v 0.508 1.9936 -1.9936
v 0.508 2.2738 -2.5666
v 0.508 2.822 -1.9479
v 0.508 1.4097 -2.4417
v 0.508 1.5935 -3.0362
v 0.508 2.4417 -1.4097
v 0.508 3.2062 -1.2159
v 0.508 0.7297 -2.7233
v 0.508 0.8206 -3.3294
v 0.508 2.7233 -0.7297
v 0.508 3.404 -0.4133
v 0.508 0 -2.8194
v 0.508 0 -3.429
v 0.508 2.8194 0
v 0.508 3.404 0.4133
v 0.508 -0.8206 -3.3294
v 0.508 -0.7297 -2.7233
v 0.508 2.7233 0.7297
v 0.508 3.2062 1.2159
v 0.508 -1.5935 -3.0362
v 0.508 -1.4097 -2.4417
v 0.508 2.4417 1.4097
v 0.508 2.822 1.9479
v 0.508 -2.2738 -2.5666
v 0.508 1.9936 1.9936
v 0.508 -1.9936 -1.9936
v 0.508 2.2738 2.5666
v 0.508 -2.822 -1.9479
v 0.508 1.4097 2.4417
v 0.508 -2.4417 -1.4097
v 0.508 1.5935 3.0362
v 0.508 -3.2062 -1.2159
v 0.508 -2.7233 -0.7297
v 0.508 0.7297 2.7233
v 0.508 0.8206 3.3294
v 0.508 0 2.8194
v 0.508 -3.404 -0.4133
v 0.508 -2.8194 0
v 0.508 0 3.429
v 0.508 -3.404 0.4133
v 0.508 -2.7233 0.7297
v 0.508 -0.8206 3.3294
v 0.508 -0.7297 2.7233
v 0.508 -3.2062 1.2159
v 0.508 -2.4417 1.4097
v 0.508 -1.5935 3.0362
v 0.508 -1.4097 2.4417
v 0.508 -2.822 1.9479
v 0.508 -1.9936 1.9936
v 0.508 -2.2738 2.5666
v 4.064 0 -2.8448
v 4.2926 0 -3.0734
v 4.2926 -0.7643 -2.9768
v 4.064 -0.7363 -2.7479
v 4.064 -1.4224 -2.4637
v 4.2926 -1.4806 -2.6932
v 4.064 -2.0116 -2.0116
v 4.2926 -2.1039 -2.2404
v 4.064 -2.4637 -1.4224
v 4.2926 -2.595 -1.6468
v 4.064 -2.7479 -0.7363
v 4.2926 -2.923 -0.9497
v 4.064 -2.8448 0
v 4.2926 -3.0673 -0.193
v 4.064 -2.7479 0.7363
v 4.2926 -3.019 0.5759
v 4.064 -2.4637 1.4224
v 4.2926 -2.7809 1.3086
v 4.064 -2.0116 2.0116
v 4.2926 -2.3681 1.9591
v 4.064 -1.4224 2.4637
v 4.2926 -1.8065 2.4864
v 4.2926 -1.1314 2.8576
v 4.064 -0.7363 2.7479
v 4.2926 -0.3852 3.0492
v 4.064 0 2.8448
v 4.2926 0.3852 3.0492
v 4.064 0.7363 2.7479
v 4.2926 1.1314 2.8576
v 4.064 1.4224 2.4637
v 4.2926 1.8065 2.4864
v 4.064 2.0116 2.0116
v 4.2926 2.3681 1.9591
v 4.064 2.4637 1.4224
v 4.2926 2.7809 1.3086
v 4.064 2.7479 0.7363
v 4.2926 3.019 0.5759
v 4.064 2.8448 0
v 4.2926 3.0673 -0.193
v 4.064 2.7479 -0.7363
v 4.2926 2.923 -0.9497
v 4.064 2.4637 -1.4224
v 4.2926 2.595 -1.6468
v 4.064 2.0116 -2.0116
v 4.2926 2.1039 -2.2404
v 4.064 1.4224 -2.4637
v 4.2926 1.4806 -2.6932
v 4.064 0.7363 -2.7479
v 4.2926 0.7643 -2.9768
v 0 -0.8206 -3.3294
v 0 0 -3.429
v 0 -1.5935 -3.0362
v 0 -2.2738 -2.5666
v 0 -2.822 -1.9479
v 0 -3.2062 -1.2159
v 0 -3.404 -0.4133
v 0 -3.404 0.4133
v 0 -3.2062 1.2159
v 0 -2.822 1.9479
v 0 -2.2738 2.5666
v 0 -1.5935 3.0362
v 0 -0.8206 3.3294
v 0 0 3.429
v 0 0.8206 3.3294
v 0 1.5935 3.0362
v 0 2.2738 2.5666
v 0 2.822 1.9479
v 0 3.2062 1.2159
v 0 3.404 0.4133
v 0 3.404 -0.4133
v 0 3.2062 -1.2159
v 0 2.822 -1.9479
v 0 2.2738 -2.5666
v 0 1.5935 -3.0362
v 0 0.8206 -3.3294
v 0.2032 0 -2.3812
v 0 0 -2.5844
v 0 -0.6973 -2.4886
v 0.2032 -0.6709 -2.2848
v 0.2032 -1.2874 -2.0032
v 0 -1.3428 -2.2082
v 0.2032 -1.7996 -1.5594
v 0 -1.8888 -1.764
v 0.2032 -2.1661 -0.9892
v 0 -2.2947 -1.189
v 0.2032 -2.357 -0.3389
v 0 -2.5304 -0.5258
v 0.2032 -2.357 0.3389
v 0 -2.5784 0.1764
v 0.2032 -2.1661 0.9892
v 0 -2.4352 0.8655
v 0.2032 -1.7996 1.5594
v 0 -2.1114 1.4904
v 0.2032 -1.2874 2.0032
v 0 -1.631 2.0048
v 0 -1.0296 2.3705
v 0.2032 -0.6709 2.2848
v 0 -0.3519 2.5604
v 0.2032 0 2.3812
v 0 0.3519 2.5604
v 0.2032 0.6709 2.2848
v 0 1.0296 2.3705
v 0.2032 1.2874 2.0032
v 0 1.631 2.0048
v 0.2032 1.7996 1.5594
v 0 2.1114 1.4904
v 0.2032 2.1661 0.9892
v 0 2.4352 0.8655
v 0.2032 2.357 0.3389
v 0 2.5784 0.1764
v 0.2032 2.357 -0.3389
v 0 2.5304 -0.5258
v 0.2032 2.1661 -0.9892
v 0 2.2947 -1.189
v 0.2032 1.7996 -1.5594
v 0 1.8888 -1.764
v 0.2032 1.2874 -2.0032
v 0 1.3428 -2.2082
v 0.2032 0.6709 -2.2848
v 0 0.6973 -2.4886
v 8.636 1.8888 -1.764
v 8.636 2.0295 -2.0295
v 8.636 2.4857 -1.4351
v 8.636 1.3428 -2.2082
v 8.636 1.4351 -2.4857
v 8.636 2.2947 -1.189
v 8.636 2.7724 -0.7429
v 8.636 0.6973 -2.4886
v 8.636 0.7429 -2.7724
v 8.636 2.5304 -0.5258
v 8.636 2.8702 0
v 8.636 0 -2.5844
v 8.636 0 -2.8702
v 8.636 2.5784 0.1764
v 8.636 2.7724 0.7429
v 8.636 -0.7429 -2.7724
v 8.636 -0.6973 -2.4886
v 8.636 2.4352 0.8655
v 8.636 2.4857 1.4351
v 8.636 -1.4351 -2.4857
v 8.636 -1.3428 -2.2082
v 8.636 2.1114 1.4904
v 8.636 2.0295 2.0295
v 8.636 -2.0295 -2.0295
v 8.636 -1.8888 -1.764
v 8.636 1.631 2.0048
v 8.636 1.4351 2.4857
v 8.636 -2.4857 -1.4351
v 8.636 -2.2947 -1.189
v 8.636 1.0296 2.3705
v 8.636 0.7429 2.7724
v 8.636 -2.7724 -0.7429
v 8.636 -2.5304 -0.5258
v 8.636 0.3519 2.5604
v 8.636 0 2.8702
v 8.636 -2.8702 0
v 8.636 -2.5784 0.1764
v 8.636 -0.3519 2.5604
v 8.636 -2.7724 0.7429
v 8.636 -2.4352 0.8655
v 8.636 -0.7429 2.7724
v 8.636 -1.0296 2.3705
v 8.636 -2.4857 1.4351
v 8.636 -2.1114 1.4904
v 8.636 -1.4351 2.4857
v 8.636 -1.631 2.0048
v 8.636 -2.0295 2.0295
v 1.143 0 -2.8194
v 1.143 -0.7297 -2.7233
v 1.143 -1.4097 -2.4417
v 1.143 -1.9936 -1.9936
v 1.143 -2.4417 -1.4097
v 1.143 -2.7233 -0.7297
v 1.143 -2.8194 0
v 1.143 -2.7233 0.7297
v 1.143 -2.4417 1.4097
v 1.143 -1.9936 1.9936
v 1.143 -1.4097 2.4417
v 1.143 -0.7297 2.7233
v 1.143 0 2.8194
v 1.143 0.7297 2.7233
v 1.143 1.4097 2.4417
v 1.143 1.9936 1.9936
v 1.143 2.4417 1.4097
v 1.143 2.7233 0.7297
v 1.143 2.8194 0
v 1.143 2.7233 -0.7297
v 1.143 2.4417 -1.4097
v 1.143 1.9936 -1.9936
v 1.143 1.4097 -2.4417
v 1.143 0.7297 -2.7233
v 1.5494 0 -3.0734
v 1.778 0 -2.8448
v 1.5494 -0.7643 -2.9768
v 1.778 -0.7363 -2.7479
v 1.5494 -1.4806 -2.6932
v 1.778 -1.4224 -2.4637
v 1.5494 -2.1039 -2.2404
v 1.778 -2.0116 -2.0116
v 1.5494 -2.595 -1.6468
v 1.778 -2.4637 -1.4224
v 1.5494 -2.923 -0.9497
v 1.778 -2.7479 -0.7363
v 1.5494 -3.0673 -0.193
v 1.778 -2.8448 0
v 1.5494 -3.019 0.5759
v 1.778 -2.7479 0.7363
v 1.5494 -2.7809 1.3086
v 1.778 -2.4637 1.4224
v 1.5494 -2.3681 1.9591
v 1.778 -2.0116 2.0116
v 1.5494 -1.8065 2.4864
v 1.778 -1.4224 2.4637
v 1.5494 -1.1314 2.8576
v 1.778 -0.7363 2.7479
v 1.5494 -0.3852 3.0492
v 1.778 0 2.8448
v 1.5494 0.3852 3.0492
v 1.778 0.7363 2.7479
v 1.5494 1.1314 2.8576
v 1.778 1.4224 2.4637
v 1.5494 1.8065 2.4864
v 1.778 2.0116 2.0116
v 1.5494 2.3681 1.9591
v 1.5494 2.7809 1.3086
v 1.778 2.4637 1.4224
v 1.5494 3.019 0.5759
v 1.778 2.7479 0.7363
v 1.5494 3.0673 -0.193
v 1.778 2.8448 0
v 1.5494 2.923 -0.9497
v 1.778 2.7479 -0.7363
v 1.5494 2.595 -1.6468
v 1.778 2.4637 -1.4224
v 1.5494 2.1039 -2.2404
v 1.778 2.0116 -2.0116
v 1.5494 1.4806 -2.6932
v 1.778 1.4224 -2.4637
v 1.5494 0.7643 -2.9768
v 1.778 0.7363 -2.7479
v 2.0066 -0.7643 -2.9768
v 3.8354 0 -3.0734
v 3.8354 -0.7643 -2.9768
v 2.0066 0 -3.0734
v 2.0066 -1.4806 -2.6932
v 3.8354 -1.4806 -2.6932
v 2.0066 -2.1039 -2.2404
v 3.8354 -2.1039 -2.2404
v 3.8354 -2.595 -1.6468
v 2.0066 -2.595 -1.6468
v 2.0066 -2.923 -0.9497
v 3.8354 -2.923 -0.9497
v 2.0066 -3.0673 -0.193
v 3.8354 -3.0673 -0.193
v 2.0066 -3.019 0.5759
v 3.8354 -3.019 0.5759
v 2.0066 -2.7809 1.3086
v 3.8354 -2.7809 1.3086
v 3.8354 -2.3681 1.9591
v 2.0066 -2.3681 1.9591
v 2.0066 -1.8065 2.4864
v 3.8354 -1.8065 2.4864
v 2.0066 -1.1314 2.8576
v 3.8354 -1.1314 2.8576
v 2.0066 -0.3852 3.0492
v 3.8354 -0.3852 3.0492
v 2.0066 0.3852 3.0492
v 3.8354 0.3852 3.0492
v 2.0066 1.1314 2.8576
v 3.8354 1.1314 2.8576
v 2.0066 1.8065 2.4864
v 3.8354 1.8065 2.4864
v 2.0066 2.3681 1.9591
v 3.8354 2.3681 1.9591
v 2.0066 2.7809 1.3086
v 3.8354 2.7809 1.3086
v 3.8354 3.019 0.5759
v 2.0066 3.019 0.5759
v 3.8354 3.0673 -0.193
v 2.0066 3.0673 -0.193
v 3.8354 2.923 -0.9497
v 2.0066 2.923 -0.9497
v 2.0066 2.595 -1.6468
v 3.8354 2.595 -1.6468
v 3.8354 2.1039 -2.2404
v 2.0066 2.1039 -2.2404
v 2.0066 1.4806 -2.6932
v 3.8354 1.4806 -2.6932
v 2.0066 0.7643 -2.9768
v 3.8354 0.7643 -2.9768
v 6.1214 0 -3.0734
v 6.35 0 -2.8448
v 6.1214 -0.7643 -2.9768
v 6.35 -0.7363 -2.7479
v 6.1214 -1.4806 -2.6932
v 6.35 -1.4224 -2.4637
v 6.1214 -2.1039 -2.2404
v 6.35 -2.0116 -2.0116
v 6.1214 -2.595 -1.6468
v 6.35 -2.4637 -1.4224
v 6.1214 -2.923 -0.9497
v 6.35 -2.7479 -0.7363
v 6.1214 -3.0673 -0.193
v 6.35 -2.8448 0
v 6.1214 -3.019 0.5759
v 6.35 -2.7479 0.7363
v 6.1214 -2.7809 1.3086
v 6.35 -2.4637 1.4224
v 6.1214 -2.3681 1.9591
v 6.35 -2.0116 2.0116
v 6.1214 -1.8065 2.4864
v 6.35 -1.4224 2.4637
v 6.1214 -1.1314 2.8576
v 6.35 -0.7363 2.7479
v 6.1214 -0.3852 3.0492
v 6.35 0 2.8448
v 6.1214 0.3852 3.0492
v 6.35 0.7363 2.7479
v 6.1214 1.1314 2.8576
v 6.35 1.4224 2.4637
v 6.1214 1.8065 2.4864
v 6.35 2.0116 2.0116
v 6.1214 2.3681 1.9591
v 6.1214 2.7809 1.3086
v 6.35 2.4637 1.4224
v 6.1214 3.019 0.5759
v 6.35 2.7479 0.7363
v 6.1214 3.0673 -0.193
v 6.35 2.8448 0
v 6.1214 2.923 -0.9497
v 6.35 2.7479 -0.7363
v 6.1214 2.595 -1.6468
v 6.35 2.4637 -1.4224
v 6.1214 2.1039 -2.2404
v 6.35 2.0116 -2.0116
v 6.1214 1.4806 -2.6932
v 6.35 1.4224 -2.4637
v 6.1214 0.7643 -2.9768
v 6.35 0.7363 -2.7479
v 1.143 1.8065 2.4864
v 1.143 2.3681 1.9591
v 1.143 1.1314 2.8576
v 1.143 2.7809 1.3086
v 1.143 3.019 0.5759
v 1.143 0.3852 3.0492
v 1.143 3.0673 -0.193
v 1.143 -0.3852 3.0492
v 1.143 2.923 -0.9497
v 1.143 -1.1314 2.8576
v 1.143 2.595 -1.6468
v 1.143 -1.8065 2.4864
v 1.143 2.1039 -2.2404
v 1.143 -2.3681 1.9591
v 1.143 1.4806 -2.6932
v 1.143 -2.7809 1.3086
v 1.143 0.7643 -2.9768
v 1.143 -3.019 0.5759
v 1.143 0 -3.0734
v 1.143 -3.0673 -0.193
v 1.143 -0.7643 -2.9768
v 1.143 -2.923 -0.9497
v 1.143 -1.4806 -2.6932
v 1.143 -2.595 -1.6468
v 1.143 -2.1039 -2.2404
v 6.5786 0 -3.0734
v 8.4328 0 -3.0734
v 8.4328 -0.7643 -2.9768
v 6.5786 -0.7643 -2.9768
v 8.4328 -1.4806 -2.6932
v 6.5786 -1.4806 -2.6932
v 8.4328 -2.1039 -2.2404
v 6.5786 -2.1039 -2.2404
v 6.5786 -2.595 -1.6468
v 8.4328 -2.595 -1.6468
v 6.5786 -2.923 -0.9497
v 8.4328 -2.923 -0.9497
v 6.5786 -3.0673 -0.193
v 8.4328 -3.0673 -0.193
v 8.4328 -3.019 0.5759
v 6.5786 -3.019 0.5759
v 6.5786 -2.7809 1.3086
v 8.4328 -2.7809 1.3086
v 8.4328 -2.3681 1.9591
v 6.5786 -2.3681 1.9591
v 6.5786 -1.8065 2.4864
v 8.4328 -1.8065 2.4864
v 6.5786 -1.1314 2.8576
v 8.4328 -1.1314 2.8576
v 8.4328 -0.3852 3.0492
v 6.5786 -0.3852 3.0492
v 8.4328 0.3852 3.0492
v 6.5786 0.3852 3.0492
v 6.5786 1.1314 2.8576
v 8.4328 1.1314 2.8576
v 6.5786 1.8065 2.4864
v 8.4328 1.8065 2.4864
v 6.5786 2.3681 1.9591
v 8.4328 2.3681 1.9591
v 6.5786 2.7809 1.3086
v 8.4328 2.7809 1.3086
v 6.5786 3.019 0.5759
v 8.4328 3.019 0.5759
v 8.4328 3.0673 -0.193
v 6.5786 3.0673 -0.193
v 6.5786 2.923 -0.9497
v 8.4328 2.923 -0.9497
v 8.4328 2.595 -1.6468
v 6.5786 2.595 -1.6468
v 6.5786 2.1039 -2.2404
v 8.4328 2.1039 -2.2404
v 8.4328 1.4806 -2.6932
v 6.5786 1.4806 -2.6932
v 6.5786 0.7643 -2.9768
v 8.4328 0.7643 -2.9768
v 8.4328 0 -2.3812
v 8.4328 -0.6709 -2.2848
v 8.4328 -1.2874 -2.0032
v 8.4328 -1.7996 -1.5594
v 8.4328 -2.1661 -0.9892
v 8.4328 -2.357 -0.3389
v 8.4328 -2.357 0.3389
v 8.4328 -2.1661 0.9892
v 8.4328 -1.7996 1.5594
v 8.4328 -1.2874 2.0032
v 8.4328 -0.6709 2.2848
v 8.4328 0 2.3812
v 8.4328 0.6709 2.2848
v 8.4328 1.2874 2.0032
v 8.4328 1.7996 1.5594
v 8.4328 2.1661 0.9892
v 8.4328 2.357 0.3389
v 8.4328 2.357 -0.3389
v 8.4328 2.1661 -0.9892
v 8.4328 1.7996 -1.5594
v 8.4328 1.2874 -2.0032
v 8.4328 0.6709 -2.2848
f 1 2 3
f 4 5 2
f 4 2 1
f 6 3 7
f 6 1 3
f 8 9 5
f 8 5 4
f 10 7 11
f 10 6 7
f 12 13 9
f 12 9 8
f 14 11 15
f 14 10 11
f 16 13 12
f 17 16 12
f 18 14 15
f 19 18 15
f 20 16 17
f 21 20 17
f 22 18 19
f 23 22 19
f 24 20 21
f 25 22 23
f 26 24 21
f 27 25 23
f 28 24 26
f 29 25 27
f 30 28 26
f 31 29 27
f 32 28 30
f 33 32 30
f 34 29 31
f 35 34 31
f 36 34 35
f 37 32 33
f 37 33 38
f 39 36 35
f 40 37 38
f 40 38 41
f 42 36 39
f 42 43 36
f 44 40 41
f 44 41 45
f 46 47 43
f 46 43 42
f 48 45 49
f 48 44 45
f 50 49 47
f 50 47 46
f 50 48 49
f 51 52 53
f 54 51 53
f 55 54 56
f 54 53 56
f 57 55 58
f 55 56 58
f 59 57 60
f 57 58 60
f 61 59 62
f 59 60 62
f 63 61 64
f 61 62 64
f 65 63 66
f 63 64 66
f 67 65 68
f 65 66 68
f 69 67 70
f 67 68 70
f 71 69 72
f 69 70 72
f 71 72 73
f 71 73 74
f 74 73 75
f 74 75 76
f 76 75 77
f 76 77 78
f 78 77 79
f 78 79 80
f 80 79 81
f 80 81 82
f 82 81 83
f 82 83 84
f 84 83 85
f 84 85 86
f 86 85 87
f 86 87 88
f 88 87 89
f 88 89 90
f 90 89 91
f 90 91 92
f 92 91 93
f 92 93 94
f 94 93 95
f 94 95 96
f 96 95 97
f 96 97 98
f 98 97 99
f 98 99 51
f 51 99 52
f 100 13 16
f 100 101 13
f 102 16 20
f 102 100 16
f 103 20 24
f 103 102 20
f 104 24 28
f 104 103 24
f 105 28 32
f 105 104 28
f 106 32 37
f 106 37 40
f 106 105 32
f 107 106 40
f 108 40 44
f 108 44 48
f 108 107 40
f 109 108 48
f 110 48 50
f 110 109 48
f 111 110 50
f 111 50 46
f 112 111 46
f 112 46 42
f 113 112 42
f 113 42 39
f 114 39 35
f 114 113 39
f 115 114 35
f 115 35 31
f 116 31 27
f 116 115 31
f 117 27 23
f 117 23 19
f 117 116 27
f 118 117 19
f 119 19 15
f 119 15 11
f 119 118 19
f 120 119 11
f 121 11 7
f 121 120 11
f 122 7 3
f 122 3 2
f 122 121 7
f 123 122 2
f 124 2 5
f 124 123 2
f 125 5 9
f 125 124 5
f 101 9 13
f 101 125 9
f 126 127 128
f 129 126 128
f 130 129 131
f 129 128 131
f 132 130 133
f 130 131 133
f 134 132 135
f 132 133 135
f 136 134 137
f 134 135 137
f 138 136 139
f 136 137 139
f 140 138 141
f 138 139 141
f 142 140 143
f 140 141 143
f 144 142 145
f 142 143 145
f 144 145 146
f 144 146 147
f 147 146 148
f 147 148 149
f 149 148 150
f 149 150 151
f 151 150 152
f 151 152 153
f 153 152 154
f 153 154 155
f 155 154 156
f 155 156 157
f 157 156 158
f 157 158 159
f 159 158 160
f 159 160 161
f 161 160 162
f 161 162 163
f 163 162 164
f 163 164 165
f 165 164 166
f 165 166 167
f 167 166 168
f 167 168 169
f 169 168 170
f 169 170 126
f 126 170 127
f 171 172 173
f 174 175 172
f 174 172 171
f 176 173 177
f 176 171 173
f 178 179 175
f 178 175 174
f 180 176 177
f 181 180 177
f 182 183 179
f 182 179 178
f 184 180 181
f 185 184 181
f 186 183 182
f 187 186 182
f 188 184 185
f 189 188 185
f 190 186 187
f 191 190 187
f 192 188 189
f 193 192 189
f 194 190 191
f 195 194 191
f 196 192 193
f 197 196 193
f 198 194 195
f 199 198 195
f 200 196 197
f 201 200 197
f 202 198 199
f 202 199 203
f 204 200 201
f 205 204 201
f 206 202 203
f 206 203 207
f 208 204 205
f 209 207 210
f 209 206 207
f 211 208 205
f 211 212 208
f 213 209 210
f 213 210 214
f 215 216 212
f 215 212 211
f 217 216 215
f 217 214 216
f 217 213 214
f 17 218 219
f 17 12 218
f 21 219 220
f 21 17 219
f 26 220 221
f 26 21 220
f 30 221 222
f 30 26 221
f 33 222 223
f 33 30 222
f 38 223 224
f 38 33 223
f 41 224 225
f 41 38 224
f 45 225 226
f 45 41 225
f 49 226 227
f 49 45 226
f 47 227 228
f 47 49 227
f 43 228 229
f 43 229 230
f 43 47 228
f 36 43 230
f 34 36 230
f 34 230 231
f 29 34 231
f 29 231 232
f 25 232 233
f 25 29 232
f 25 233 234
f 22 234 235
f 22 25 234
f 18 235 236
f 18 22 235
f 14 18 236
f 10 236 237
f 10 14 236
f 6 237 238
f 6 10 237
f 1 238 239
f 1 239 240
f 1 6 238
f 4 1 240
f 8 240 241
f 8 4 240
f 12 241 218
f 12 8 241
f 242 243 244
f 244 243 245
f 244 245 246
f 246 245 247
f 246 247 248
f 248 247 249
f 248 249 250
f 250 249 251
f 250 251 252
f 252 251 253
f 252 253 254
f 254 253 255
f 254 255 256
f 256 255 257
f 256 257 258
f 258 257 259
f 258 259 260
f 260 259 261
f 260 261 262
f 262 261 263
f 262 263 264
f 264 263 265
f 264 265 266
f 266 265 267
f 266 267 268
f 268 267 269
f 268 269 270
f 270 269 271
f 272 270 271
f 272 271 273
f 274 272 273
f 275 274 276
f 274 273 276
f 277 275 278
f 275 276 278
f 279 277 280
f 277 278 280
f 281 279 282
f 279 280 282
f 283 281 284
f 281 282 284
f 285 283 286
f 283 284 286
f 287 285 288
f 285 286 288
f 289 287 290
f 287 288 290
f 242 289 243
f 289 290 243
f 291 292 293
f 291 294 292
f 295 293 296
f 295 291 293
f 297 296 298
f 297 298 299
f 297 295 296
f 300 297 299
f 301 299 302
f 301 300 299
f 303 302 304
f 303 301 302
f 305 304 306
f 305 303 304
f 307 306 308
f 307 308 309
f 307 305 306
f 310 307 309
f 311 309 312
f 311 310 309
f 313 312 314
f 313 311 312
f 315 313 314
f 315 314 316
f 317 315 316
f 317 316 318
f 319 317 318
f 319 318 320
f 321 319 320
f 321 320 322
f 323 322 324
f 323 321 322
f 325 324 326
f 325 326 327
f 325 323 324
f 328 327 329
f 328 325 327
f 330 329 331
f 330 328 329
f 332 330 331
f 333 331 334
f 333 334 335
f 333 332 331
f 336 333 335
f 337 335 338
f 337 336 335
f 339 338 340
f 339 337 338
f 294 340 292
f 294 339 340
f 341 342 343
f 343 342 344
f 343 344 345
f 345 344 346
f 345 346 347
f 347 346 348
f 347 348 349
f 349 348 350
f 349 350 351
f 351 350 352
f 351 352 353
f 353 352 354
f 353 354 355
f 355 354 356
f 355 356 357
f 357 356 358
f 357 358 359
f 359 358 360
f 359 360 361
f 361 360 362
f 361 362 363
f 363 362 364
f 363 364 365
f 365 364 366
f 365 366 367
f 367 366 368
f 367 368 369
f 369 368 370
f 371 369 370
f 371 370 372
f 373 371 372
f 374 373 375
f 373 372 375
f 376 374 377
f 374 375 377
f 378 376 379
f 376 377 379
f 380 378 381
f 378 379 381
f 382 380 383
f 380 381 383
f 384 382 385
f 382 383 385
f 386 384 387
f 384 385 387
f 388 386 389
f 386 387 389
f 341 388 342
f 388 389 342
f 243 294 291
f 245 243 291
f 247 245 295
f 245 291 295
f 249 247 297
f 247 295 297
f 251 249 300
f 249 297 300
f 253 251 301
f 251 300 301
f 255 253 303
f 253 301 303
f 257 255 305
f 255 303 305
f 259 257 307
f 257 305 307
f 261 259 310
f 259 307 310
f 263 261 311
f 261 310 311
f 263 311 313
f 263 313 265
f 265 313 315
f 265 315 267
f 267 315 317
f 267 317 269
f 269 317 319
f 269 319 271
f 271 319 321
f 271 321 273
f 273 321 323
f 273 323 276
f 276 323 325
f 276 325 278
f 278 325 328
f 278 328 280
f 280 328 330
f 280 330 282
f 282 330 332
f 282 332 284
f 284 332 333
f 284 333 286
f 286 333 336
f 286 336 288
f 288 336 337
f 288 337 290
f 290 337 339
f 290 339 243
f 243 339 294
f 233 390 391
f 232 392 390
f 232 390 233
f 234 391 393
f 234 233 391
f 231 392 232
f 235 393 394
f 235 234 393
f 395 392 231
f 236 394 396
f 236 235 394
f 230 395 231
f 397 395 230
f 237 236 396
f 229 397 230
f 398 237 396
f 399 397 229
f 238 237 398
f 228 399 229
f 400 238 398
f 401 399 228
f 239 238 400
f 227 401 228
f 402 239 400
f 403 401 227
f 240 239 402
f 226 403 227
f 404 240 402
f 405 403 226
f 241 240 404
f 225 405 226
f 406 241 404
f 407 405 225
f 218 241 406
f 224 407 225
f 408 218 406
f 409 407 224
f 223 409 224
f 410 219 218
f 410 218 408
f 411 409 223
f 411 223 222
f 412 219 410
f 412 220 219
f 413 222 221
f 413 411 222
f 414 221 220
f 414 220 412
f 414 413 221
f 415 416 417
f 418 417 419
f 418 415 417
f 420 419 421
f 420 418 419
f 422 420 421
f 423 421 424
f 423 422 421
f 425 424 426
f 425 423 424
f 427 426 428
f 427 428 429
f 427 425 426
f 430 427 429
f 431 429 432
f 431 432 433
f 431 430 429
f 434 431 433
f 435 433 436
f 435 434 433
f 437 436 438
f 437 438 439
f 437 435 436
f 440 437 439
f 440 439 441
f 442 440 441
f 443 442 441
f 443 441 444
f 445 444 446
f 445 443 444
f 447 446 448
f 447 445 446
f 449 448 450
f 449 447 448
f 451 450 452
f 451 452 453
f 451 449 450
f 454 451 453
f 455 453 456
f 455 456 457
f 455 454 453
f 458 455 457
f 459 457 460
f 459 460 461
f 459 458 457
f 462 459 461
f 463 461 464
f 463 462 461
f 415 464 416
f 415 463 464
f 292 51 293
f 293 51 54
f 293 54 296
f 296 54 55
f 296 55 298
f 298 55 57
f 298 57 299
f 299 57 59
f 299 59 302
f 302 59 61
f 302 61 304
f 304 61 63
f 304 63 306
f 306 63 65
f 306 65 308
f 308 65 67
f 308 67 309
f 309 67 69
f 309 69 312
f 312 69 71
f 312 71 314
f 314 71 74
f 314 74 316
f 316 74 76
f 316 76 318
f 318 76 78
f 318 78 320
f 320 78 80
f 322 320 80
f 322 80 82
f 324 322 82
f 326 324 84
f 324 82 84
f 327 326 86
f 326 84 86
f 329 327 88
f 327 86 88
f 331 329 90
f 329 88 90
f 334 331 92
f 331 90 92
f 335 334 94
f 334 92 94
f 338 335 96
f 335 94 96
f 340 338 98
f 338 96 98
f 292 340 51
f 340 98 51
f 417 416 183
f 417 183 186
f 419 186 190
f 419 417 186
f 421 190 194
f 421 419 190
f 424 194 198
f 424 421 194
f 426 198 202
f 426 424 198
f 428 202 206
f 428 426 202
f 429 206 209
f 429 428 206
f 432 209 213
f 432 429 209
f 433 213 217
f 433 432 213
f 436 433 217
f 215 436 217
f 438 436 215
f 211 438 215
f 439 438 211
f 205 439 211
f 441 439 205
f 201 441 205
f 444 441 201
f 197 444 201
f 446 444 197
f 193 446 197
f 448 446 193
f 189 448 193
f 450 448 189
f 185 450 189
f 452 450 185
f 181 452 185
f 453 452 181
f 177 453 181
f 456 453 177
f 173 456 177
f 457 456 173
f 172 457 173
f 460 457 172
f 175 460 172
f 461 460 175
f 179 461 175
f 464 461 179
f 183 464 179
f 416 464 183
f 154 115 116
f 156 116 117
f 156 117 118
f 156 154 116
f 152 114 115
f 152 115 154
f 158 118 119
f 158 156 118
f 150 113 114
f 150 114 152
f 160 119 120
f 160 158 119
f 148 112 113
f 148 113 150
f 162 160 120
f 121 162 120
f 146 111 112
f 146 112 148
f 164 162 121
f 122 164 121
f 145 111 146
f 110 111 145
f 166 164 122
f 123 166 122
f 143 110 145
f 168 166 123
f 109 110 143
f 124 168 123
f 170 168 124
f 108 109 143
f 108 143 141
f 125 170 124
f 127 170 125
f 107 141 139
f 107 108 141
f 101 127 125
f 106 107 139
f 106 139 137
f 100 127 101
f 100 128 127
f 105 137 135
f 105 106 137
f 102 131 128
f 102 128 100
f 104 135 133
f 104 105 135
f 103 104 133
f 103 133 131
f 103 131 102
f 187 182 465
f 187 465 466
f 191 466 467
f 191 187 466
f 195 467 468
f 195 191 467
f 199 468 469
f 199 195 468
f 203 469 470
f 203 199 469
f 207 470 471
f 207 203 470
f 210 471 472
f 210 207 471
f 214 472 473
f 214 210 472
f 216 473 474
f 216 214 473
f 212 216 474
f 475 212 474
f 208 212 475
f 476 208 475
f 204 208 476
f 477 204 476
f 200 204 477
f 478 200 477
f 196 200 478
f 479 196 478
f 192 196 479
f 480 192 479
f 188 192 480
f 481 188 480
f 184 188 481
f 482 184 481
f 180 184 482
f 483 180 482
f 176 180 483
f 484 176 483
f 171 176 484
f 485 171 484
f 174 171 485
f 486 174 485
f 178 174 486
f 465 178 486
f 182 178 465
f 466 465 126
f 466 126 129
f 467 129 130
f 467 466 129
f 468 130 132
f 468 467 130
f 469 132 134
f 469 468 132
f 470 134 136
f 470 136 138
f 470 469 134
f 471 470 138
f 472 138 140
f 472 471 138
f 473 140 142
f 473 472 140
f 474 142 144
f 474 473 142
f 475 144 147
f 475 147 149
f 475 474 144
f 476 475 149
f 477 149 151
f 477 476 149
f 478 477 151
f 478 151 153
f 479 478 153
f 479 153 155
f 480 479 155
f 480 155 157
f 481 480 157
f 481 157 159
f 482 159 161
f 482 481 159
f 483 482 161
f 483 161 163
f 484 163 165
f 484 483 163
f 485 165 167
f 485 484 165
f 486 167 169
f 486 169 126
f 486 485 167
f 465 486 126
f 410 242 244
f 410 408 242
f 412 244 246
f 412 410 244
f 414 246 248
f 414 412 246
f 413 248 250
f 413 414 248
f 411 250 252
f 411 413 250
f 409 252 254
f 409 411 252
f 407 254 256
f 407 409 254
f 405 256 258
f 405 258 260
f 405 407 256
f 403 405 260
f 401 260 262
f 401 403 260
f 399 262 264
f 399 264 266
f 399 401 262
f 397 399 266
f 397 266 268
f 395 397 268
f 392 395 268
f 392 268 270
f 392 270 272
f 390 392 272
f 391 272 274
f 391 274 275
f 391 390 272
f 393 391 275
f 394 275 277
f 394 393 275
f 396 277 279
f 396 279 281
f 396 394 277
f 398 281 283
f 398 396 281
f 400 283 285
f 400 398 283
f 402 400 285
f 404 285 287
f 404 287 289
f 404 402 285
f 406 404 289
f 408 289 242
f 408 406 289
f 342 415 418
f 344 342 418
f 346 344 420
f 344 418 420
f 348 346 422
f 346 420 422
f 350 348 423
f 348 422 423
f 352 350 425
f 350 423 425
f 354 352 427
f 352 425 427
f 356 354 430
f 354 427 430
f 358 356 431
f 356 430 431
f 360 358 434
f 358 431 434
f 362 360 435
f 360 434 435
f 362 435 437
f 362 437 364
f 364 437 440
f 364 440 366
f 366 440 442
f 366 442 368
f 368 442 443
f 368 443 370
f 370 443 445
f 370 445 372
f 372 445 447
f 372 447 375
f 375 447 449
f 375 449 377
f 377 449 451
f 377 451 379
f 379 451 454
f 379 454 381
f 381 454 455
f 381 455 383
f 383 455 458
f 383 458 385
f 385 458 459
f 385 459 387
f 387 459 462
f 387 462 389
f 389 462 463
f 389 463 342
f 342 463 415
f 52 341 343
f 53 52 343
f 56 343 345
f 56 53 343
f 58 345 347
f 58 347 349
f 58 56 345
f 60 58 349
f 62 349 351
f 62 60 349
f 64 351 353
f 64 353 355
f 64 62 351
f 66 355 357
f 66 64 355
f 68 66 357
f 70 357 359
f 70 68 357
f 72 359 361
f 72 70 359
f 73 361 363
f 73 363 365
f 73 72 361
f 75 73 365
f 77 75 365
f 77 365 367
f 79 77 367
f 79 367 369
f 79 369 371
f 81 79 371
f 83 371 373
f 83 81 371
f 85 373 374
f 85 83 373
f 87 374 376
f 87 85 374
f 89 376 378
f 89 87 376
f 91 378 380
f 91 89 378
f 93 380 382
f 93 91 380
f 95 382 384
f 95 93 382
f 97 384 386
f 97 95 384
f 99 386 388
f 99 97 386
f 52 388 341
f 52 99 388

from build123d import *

# Parameters (mm, degrees)
CHAMFER1_SIZE   = 0.2032
CHAMFER2_SIZE   = 0.2032
LPATTERN1_COUNT = 3
LPATTERN1_PITCH = 2.286


with BuildPart() as part:
    # Sketch1 → Revolve1 (revolve)
    with BuildSketch(Plane.XY, mode=Mode.PRIVATE) as revolve1_sk:
        Polygon((0, 2.38125), (8.636, 2.38125), (8.636, 3.0734), (1.143, 3.0734), (1.143, 2.8194), (0.508, 2.8194), (0.508, 3.429), (0, 3.429), align=None)
    revolve(revolve1_sk.sketch.rotate(Axis((0, 0, 0), (-1, 0, 0)), 90), axis=Axis((0, 0, 0), (-1, 0, 0)))

    # Chamfer1
    chamfer1_edges = [part.edges().sort_by_distance(p)[0] for p in [
        (0, 0, 2.38125),
        (8.636, 0, 2.38125),
    ]]
    chamfer(chamfer1_edges, length=CHAMFER1_SIZE)

    # Chamfer2
    chamfer2_edges = [part.edges().sort_by_distance(p)[0] for p in [
        (8.636, 0, 3.0734),
    ]]
    chamfer(chamfer2_edges, length=CHAMFER2_SIZE)

    # Sketch2 → Cut-Revolve1 (revolve, cut)
    with BuildSketch(Plane.XY, mode=Mode.PRIVATE) as cut_revolve1_sk:
        Polygon((1.262276686, 3.360523314), (1.778, 2.8448), (2.293723314, 3.360523314), align=None)
    cut_revolve1 = revolve(cut_revolve1_sk.sketch.rotate(Axis((0, 0, 0), (-1, 0, 0)), 90), axis=Axis((0, 0, 0), (-1, 0, 0)), mode=Mode.SUBTRACT)

    # LPattern1: Cut-Revolve1 ×3
    with Locations(*[(i * LPATTERN1_PITCH, 0, 0) for i in range(1, LPATTERN1_COUNT)]):
        add(cut_revolve1, mode=Mode.SUBTRACT)


solid = part.part
